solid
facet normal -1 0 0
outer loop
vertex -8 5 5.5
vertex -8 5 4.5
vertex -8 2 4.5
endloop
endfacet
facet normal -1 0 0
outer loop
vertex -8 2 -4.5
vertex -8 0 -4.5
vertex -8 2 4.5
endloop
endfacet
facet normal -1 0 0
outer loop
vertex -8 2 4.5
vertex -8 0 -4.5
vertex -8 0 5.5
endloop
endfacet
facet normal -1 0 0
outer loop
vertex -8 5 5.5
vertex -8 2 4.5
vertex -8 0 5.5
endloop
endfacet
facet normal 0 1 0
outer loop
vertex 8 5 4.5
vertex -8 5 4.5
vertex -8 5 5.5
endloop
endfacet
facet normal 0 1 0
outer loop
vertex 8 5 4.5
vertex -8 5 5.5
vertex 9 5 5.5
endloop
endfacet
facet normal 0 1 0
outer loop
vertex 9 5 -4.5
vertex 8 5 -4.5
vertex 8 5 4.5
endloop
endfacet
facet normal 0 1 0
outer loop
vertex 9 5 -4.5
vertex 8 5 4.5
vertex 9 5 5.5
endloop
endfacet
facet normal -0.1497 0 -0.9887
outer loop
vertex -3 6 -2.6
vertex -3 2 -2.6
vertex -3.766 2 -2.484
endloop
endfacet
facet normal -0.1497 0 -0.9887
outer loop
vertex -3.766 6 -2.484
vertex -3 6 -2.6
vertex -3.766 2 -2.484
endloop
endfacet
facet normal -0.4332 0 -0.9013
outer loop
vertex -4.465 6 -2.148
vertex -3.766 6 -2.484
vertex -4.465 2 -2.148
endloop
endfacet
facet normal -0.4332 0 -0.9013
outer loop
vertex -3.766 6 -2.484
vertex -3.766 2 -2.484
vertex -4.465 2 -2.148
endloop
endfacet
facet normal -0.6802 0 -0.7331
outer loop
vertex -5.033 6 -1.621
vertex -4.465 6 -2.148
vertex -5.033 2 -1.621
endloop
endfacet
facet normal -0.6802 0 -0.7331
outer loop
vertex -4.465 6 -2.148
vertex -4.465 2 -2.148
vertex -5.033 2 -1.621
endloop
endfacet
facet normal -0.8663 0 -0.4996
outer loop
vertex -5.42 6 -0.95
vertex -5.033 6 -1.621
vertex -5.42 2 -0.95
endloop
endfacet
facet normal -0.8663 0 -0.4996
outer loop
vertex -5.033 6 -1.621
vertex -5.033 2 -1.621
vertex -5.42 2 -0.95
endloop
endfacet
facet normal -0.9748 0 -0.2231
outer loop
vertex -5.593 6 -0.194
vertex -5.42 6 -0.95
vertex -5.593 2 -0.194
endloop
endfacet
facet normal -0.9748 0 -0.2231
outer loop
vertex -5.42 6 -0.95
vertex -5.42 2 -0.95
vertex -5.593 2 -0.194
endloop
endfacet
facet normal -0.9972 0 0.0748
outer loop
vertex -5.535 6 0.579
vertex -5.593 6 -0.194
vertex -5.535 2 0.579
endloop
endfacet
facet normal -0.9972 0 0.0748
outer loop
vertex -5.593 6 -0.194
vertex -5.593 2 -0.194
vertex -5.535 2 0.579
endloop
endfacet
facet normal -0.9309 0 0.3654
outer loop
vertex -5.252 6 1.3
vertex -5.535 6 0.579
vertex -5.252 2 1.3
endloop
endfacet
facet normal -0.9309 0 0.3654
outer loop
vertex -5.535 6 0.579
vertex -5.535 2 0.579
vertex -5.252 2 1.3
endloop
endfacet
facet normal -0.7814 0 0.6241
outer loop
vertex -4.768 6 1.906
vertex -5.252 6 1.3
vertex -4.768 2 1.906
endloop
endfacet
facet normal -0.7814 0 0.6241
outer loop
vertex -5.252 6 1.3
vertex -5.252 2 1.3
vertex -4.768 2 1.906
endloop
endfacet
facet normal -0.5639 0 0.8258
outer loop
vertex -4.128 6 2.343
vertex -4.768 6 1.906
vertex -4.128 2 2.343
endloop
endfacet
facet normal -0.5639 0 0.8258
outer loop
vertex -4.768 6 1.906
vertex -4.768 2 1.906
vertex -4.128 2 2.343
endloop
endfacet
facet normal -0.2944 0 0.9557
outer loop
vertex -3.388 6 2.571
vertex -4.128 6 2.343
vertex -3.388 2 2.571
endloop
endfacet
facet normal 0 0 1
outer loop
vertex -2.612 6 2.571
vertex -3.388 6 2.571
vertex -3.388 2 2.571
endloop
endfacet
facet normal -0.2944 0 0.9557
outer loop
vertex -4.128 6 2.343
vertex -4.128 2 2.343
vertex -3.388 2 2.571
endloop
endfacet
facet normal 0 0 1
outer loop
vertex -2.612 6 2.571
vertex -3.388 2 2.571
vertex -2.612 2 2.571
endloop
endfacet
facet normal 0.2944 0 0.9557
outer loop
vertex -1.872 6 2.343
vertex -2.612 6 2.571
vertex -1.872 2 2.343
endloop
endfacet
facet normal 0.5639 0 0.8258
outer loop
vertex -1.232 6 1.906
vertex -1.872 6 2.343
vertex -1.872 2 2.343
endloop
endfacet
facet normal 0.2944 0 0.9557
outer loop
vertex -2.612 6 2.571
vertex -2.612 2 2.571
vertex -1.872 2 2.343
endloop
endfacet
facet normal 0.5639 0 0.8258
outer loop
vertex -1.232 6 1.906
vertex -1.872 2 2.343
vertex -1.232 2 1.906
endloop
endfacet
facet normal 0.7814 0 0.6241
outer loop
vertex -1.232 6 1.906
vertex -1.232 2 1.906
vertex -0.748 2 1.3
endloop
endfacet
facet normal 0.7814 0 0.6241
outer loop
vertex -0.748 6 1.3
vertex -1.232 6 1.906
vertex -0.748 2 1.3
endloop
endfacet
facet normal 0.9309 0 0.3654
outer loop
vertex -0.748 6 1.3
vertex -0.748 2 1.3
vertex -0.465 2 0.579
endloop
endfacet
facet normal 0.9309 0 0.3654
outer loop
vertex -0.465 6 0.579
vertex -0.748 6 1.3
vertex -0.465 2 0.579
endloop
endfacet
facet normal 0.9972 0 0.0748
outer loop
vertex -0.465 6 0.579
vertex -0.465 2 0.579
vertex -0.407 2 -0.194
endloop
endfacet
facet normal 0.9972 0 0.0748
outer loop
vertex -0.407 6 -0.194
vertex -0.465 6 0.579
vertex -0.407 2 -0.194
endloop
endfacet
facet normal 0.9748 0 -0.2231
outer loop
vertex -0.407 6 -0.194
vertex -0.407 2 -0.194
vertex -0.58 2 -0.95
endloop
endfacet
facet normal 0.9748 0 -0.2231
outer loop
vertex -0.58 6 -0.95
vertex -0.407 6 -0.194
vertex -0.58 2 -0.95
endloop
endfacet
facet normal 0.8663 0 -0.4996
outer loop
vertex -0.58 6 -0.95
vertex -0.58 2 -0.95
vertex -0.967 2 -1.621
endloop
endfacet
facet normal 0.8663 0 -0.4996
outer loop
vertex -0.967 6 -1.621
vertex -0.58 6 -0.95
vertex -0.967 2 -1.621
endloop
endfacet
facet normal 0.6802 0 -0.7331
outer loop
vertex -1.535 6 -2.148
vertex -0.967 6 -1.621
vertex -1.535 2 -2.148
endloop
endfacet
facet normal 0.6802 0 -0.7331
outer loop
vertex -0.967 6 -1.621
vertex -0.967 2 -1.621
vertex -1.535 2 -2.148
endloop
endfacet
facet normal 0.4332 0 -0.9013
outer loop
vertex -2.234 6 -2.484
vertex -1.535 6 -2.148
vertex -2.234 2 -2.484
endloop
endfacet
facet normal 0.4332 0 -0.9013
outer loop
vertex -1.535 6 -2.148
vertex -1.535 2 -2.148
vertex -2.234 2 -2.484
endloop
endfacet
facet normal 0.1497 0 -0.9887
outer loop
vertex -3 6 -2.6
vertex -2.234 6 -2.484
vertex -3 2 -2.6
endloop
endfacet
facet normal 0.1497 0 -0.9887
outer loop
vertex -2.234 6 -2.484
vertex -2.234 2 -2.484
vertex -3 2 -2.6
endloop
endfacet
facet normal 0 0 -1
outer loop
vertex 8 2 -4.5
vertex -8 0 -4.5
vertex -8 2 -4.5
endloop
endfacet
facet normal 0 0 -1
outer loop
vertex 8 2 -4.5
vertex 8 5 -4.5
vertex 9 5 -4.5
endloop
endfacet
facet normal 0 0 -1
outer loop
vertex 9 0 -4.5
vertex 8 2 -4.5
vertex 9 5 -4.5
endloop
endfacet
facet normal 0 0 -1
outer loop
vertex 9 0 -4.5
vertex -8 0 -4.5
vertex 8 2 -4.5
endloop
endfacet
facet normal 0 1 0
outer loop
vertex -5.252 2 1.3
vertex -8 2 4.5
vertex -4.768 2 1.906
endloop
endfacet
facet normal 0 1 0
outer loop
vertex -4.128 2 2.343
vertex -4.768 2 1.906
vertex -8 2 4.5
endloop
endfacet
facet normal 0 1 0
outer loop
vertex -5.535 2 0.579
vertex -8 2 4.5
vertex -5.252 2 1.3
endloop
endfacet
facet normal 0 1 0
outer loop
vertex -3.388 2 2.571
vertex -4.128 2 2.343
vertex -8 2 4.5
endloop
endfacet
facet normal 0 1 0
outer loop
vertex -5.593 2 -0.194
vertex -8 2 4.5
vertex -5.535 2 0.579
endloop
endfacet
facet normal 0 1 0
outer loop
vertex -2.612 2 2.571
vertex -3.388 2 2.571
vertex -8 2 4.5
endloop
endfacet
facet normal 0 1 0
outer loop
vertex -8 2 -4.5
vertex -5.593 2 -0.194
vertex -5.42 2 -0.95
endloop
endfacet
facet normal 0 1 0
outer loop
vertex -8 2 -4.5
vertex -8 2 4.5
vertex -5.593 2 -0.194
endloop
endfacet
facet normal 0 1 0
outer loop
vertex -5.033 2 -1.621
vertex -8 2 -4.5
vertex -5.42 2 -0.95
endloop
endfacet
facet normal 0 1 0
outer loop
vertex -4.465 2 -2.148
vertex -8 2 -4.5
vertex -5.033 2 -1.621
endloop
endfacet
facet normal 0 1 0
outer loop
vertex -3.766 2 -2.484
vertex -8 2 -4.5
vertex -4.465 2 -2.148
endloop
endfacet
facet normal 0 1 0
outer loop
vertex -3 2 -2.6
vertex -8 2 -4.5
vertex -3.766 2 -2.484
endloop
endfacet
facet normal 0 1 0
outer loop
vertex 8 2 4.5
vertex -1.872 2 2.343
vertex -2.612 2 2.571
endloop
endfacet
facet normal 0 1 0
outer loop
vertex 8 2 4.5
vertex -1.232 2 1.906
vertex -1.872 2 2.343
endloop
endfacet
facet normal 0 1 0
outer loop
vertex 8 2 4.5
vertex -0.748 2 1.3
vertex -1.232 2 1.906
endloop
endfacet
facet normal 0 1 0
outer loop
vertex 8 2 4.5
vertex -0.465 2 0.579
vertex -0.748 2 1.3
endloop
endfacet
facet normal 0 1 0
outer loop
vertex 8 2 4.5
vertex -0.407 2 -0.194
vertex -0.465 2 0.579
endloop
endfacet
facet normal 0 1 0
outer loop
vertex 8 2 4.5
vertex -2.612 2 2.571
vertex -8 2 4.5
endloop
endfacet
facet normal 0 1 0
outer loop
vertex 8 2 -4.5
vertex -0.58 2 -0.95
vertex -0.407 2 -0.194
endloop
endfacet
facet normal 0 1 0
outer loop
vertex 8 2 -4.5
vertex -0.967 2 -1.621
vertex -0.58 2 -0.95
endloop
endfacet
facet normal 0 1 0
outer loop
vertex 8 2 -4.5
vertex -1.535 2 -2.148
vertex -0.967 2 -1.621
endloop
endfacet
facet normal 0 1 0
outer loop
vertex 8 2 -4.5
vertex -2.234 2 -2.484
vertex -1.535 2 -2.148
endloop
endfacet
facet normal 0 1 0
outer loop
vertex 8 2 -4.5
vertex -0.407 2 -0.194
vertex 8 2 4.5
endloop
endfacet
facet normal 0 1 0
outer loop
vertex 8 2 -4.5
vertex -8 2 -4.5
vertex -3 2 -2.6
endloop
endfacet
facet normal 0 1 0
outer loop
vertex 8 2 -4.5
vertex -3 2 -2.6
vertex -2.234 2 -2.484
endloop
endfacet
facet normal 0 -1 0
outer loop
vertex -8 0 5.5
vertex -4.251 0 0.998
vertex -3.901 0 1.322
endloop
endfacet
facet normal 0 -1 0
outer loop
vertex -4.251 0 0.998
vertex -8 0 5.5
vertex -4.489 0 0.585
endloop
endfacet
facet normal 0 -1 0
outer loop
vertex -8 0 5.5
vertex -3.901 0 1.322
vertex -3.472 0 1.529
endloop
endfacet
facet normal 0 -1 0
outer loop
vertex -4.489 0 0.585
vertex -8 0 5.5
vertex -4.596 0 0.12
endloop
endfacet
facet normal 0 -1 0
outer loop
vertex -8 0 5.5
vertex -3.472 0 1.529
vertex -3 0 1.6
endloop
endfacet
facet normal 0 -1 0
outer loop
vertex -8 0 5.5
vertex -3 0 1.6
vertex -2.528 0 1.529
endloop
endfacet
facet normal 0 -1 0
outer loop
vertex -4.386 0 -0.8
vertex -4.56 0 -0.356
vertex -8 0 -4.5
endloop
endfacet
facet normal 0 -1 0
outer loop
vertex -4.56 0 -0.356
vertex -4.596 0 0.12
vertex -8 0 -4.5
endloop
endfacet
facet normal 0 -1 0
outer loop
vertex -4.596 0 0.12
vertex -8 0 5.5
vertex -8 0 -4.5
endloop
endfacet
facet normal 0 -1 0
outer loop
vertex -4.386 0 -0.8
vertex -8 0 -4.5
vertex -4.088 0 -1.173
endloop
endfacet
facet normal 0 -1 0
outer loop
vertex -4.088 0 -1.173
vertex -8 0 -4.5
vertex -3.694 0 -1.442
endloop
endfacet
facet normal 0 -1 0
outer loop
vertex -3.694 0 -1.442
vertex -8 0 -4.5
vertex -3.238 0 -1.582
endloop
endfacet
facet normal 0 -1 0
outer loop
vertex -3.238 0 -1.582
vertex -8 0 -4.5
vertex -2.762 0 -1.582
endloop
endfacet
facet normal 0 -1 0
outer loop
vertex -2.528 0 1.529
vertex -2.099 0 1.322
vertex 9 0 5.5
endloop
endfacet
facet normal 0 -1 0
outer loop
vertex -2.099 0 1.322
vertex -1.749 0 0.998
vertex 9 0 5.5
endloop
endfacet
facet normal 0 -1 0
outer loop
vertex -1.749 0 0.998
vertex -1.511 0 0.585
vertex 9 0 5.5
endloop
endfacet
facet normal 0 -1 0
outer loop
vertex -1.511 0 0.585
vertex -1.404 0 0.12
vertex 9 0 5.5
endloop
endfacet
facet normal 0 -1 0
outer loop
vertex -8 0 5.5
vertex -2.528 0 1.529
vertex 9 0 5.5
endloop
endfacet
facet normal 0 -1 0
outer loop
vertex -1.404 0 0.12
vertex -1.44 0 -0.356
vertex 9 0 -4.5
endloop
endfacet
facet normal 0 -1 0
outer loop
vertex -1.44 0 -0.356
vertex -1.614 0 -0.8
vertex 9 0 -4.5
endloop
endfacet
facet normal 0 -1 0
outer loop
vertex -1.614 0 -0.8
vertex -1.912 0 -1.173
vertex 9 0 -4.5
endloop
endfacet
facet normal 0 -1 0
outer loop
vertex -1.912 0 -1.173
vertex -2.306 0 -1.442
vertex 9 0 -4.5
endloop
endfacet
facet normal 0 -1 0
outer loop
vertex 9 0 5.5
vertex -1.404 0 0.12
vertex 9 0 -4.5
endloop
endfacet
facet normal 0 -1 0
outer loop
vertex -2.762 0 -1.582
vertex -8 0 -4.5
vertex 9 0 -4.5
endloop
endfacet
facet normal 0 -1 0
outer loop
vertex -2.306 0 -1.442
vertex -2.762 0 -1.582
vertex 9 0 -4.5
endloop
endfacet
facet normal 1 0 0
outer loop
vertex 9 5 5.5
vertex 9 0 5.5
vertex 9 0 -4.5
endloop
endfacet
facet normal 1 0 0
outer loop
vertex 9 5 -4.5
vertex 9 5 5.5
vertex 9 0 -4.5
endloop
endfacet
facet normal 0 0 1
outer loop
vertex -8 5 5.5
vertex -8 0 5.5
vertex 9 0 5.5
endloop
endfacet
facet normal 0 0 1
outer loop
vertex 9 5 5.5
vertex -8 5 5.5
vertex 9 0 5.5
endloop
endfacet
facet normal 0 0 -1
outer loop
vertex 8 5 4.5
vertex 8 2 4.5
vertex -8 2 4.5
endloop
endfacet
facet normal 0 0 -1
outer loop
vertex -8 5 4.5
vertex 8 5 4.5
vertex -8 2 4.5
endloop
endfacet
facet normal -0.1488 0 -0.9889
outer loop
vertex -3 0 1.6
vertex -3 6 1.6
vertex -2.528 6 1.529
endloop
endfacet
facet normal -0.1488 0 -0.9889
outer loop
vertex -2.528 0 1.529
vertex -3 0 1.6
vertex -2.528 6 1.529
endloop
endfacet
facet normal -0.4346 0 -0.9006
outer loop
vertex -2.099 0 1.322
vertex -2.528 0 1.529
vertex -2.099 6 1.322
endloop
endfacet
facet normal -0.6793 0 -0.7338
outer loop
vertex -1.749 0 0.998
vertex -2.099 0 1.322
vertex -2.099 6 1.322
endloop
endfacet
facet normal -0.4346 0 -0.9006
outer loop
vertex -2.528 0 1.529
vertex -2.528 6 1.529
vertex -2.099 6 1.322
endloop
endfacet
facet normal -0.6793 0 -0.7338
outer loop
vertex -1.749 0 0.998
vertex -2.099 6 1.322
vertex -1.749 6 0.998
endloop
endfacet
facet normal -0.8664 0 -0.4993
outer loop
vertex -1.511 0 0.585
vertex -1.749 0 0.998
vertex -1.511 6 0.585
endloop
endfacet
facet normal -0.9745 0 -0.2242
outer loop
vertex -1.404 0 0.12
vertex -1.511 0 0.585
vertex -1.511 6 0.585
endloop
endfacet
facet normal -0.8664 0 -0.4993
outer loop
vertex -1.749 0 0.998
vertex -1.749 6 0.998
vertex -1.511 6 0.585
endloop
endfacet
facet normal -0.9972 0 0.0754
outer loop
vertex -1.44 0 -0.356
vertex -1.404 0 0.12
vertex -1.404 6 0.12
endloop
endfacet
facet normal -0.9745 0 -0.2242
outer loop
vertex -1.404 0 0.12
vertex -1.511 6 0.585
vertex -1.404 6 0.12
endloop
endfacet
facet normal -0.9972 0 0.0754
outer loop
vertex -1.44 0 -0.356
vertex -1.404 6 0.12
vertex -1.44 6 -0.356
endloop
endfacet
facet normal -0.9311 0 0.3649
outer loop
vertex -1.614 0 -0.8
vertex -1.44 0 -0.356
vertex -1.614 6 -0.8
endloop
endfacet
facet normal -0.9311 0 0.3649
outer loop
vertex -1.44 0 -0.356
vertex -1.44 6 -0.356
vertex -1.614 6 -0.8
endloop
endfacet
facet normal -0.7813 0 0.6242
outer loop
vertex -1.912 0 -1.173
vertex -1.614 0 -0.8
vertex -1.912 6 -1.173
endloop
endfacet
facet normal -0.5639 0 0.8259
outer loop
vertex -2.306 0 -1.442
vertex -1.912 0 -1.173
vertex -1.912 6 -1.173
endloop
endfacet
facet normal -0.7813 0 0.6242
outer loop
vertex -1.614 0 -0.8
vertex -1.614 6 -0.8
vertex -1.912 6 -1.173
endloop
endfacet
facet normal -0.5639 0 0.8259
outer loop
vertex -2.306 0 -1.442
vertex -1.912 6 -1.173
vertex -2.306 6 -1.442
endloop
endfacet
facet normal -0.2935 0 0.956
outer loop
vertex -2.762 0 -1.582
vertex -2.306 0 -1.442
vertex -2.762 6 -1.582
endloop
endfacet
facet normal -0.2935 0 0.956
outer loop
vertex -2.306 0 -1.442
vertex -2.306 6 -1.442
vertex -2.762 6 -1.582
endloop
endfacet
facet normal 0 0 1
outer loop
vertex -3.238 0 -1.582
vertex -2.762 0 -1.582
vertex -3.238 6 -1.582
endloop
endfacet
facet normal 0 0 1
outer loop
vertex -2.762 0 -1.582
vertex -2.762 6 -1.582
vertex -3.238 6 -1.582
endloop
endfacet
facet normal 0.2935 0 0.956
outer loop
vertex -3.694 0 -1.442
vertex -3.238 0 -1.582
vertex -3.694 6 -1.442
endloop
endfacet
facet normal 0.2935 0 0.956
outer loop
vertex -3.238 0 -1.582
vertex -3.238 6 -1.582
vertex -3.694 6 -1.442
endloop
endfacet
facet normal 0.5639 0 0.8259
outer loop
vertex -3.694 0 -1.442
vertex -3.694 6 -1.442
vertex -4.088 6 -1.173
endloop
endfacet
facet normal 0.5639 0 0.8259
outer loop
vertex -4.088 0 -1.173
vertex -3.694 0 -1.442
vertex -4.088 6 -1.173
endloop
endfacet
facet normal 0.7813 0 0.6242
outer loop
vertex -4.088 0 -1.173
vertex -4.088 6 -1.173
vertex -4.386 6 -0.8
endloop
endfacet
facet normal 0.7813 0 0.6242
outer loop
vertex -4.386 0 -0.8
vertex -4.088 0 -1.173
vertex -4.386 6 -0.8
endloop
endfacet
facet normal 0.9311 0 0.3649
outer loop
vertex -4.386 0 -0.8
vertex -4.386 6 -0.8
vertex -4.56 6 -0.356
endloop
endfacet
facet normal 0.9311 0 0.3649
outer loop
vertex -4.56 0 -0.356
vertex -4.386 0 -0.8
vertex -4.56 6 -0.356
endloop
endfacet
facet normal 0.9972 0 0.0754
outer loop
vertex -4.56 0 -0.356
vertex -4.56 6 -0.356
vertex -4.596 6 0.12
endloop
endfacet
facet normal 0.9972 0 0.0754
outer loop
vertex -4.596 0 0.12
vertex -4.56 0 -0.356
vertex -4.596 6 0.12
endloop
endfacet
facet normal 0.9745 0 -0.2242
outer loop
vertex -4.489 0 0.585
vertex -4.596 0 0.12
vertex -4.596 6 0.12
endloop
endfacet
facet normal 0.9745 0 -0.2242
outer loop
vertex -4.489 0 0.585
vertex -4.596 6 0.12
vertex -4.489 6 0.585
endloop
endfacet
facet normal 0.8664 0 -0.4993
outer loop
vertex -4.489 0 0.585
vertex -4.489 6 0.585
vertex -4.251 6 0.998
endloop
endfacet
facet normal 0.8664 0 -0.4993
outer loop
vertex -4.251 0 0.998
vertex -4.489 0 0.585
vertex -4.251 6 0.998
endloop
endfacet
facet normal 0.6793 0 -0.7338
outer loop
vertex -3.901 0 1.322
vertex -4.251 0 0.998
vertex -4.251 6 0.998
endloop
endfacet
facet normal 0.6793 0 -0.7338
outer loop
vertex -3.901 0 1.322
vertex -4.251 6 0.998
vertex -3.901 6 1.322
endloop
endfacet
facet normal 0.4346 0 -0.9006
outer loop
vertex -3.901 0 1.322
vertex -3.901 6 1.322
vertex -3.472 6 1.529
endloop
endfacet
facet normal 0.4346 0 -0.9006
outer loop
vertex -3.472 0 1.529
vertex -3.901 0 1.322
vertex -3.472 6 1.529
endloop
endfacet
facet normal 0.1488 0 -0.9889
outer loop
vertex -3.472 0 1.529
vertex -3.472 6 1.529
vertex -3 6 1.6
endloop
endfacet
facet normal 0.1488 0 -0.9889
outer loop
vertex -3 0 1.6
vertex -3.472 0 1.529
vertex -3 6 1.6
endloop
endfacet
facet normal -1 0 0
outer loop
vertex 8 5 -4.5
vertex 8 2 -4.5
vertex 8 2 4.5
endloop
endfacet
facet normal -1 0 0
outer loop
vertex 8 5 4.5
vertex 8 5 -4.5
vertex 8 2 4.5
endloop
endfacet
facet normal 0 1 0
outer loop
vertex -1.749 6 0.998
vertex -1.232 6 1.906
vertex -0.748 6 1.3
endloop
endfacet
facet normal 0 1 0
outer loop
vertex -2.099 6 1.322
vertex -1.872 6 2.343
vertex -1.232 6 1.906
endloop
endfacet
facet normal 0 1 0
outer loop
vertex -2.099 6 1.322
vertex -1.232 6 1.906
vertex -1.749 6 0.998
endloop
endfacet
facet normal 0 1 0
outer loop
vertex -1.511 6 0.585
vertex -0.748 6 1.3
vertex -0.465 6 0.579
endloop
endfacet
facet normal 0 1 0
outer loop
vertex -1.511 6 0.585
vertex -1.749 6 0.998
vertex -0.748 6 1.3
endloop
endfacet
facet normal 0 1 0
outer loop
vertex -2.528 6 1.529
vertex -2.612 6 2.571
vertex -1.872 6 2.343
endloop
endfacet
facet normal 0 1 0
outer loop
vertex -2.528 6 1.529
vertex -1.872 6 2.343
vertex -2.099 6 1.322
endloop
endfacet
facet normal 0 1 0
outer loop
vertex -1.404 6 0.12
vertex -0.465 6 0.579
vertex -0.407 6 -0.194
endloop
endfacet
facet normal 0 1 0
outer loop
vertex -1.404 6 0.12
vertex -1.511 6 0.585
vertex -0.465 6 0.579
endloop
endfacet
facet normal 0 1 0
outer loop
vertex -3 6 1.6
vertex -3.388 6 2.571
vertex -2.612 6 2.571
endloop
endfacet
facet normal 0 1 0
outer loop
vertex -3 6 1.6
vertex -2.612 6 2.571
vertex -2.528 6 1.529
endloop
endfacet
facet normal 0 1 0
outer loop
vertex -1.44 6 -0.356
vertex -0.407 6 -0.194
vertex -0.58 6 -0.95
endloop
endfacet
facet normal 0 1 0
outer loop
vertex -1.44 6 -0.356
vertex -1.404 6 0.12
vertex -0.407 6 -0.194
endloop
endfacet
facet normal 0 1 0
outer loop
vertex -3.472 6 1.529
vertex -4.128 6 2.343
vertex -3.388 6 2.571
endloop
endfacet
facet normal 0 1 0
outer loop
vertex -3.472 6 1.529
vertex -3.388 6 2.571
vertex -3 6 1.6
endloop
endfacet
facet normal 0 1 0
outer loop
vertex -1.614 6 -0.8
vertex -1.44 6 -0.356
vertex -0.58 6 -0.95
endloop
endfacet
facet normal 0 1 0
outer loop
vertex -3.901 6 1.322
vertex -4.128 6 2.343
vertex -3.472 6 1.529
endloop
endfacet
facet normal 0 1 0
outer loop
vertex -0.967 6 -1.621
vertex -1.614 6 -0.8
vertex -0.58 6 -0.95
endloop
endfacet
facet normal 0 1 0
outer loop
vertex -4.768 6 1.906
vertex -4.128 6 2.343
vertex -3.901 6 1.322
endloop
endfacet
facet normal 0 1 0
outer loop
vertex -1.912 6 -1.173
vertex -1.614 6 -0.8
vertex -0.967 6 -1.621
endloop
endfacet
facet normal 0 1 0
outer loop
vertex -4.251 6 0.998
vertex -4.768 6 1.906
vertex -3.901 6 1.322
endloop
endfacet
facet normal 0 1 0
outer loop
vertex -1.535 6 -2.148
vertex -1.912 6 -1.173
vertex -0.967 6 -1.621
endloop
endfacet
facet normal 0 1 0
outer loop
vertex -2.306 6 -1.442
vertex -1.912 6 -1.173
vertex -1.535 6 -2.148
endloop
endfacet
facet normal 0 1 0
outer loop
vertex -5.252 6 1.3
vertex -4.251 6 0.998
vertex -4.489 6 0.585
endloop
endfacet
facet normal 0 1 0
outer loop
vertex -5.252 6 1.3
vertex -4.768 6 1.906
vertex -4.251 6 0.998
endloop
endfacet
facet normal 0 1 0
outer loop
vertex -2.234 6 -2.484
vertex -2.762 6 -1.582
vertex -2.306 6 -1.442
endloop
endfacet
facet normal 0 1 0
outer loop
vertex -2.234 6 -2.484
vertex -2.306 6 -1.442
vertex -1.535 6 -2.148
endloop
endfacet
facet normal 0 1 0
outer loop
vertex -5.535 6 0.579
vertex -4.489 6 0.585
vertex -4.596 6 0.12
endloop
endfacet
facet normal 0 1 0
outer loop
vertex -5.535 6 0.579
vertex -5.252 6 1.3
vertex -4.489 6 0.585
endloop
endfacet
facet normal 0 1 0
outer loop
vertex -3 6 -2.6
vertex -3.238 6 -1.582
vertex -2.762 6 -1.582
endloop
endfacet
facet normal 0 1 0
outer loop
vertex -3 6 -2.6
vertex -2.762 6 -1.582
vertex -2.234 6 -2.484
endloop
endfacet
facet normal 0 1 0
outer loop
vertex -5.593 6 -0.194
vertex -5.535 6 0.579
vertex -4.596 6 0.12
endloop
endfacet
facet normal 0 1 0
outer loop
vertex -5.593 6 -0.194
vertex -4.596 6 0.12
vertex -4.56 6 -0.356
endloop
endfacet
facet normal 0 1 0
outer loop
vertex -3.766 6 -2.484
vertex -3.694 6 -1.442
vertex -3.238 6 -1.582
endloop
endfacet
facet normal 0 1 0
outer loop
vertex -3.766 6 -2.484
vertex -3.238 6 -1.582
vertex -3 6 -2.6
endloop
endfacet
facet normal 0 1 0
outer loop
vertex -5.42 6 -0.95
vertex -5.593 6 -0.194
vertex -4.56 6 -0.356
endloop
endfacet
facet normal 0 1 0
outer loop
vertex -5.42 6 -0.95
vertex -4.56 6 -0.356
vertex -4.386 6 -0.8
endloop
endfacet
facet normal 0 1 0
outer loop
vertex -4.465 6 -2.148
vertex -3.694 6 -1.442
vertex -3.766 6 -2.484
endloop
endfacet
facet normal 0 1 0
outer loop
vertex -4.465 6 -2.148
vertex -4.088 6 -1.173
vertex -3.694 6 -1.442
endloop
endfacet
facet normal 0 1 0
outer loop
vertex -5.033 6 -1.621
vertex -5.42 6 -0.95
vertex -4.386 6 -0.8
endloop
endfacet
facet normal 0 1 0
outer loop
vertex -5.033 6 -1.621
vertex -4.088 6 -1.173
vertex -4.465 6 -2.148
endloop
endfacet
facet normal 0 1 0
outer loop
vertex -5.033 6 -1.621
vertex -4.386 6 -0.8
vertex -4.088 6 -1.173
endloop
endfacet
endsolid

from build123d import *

# Parameters (mm, degrees)
SKETCH_1_W           = 16
SKETCH_1_H           = 9
EXTRUDE_1_DEPTH      = 2
SKETCH_2_R           = 2.6
EXTRUDE_2_DEPTH      = 4
EXTRUDE_3_DEPTH      = 3
EXTRUDE_3_DEPTH_BACK = 2
SKETCH_4_R           = 1.6
CUT_EXTRUDE_1_DEPTH  = 13.1346611


with BuildPart() as part:
    # 草图1 → 凸台-拉伸1 (new body)
    with BuildSketch(Plane(origin=(0, 0, 0), x_dir=(1, 0, 0), z_dir=(0, 1, 0))):
        Rectangle(SKETCH_1_W, SKETCH_1_H)
    extrude(amount=EXTRUDE_1_DEPTH)

    # 草图2 → 凸台-拉伸2 (add)
    with BuildSketch(Plane(origin=(0, 2, 0), x_dir=(1, 0, 0), z_dir=(0, 1, 0))):
        with Locations(Location((-3, 0, 0), (0, 0, 90))):
            Circle(SKETCH_2_R)
    extrude(amount=EXTRUDE_2_DEPTH)

    # 草图3 → 凸台-拉伸3 (add, two sides: drawn at the far end of the back side and taken through both)
    with BuildSketch(Plane(origin=(0, 2, 0), x_dir=(1, 0, 0), z_dir=(0, 1, 0)).offset(-EXTRUDE_3_DEPTH_BACK)):
        Polygon((-8, -4.5), (-8, -5.5), (9, -5.5), (9, 4.5), (8, 4.5), (8, -4.5), align=None)
    extrude(amount=EXTRUDE_3_DEPTH + EXTRUDE_3_DEPTH_BACK)

    # 草图4 → 切除-拉伸1 (cut, through all)
    with BuildSketch(Plane(origin=(0, 6, 0), x_dir=(1, 0, 0), z_dir=(0, 1, 0))):
        with Locations(Location((-3, 0, 0), (0, 0, 270))):
            Circle(SKETCH_4_R)
    extrude(amount=-CUT_EXTRUDE_1_DEPTH, mode=Mode.SUBTRACT)


solid = part.part
